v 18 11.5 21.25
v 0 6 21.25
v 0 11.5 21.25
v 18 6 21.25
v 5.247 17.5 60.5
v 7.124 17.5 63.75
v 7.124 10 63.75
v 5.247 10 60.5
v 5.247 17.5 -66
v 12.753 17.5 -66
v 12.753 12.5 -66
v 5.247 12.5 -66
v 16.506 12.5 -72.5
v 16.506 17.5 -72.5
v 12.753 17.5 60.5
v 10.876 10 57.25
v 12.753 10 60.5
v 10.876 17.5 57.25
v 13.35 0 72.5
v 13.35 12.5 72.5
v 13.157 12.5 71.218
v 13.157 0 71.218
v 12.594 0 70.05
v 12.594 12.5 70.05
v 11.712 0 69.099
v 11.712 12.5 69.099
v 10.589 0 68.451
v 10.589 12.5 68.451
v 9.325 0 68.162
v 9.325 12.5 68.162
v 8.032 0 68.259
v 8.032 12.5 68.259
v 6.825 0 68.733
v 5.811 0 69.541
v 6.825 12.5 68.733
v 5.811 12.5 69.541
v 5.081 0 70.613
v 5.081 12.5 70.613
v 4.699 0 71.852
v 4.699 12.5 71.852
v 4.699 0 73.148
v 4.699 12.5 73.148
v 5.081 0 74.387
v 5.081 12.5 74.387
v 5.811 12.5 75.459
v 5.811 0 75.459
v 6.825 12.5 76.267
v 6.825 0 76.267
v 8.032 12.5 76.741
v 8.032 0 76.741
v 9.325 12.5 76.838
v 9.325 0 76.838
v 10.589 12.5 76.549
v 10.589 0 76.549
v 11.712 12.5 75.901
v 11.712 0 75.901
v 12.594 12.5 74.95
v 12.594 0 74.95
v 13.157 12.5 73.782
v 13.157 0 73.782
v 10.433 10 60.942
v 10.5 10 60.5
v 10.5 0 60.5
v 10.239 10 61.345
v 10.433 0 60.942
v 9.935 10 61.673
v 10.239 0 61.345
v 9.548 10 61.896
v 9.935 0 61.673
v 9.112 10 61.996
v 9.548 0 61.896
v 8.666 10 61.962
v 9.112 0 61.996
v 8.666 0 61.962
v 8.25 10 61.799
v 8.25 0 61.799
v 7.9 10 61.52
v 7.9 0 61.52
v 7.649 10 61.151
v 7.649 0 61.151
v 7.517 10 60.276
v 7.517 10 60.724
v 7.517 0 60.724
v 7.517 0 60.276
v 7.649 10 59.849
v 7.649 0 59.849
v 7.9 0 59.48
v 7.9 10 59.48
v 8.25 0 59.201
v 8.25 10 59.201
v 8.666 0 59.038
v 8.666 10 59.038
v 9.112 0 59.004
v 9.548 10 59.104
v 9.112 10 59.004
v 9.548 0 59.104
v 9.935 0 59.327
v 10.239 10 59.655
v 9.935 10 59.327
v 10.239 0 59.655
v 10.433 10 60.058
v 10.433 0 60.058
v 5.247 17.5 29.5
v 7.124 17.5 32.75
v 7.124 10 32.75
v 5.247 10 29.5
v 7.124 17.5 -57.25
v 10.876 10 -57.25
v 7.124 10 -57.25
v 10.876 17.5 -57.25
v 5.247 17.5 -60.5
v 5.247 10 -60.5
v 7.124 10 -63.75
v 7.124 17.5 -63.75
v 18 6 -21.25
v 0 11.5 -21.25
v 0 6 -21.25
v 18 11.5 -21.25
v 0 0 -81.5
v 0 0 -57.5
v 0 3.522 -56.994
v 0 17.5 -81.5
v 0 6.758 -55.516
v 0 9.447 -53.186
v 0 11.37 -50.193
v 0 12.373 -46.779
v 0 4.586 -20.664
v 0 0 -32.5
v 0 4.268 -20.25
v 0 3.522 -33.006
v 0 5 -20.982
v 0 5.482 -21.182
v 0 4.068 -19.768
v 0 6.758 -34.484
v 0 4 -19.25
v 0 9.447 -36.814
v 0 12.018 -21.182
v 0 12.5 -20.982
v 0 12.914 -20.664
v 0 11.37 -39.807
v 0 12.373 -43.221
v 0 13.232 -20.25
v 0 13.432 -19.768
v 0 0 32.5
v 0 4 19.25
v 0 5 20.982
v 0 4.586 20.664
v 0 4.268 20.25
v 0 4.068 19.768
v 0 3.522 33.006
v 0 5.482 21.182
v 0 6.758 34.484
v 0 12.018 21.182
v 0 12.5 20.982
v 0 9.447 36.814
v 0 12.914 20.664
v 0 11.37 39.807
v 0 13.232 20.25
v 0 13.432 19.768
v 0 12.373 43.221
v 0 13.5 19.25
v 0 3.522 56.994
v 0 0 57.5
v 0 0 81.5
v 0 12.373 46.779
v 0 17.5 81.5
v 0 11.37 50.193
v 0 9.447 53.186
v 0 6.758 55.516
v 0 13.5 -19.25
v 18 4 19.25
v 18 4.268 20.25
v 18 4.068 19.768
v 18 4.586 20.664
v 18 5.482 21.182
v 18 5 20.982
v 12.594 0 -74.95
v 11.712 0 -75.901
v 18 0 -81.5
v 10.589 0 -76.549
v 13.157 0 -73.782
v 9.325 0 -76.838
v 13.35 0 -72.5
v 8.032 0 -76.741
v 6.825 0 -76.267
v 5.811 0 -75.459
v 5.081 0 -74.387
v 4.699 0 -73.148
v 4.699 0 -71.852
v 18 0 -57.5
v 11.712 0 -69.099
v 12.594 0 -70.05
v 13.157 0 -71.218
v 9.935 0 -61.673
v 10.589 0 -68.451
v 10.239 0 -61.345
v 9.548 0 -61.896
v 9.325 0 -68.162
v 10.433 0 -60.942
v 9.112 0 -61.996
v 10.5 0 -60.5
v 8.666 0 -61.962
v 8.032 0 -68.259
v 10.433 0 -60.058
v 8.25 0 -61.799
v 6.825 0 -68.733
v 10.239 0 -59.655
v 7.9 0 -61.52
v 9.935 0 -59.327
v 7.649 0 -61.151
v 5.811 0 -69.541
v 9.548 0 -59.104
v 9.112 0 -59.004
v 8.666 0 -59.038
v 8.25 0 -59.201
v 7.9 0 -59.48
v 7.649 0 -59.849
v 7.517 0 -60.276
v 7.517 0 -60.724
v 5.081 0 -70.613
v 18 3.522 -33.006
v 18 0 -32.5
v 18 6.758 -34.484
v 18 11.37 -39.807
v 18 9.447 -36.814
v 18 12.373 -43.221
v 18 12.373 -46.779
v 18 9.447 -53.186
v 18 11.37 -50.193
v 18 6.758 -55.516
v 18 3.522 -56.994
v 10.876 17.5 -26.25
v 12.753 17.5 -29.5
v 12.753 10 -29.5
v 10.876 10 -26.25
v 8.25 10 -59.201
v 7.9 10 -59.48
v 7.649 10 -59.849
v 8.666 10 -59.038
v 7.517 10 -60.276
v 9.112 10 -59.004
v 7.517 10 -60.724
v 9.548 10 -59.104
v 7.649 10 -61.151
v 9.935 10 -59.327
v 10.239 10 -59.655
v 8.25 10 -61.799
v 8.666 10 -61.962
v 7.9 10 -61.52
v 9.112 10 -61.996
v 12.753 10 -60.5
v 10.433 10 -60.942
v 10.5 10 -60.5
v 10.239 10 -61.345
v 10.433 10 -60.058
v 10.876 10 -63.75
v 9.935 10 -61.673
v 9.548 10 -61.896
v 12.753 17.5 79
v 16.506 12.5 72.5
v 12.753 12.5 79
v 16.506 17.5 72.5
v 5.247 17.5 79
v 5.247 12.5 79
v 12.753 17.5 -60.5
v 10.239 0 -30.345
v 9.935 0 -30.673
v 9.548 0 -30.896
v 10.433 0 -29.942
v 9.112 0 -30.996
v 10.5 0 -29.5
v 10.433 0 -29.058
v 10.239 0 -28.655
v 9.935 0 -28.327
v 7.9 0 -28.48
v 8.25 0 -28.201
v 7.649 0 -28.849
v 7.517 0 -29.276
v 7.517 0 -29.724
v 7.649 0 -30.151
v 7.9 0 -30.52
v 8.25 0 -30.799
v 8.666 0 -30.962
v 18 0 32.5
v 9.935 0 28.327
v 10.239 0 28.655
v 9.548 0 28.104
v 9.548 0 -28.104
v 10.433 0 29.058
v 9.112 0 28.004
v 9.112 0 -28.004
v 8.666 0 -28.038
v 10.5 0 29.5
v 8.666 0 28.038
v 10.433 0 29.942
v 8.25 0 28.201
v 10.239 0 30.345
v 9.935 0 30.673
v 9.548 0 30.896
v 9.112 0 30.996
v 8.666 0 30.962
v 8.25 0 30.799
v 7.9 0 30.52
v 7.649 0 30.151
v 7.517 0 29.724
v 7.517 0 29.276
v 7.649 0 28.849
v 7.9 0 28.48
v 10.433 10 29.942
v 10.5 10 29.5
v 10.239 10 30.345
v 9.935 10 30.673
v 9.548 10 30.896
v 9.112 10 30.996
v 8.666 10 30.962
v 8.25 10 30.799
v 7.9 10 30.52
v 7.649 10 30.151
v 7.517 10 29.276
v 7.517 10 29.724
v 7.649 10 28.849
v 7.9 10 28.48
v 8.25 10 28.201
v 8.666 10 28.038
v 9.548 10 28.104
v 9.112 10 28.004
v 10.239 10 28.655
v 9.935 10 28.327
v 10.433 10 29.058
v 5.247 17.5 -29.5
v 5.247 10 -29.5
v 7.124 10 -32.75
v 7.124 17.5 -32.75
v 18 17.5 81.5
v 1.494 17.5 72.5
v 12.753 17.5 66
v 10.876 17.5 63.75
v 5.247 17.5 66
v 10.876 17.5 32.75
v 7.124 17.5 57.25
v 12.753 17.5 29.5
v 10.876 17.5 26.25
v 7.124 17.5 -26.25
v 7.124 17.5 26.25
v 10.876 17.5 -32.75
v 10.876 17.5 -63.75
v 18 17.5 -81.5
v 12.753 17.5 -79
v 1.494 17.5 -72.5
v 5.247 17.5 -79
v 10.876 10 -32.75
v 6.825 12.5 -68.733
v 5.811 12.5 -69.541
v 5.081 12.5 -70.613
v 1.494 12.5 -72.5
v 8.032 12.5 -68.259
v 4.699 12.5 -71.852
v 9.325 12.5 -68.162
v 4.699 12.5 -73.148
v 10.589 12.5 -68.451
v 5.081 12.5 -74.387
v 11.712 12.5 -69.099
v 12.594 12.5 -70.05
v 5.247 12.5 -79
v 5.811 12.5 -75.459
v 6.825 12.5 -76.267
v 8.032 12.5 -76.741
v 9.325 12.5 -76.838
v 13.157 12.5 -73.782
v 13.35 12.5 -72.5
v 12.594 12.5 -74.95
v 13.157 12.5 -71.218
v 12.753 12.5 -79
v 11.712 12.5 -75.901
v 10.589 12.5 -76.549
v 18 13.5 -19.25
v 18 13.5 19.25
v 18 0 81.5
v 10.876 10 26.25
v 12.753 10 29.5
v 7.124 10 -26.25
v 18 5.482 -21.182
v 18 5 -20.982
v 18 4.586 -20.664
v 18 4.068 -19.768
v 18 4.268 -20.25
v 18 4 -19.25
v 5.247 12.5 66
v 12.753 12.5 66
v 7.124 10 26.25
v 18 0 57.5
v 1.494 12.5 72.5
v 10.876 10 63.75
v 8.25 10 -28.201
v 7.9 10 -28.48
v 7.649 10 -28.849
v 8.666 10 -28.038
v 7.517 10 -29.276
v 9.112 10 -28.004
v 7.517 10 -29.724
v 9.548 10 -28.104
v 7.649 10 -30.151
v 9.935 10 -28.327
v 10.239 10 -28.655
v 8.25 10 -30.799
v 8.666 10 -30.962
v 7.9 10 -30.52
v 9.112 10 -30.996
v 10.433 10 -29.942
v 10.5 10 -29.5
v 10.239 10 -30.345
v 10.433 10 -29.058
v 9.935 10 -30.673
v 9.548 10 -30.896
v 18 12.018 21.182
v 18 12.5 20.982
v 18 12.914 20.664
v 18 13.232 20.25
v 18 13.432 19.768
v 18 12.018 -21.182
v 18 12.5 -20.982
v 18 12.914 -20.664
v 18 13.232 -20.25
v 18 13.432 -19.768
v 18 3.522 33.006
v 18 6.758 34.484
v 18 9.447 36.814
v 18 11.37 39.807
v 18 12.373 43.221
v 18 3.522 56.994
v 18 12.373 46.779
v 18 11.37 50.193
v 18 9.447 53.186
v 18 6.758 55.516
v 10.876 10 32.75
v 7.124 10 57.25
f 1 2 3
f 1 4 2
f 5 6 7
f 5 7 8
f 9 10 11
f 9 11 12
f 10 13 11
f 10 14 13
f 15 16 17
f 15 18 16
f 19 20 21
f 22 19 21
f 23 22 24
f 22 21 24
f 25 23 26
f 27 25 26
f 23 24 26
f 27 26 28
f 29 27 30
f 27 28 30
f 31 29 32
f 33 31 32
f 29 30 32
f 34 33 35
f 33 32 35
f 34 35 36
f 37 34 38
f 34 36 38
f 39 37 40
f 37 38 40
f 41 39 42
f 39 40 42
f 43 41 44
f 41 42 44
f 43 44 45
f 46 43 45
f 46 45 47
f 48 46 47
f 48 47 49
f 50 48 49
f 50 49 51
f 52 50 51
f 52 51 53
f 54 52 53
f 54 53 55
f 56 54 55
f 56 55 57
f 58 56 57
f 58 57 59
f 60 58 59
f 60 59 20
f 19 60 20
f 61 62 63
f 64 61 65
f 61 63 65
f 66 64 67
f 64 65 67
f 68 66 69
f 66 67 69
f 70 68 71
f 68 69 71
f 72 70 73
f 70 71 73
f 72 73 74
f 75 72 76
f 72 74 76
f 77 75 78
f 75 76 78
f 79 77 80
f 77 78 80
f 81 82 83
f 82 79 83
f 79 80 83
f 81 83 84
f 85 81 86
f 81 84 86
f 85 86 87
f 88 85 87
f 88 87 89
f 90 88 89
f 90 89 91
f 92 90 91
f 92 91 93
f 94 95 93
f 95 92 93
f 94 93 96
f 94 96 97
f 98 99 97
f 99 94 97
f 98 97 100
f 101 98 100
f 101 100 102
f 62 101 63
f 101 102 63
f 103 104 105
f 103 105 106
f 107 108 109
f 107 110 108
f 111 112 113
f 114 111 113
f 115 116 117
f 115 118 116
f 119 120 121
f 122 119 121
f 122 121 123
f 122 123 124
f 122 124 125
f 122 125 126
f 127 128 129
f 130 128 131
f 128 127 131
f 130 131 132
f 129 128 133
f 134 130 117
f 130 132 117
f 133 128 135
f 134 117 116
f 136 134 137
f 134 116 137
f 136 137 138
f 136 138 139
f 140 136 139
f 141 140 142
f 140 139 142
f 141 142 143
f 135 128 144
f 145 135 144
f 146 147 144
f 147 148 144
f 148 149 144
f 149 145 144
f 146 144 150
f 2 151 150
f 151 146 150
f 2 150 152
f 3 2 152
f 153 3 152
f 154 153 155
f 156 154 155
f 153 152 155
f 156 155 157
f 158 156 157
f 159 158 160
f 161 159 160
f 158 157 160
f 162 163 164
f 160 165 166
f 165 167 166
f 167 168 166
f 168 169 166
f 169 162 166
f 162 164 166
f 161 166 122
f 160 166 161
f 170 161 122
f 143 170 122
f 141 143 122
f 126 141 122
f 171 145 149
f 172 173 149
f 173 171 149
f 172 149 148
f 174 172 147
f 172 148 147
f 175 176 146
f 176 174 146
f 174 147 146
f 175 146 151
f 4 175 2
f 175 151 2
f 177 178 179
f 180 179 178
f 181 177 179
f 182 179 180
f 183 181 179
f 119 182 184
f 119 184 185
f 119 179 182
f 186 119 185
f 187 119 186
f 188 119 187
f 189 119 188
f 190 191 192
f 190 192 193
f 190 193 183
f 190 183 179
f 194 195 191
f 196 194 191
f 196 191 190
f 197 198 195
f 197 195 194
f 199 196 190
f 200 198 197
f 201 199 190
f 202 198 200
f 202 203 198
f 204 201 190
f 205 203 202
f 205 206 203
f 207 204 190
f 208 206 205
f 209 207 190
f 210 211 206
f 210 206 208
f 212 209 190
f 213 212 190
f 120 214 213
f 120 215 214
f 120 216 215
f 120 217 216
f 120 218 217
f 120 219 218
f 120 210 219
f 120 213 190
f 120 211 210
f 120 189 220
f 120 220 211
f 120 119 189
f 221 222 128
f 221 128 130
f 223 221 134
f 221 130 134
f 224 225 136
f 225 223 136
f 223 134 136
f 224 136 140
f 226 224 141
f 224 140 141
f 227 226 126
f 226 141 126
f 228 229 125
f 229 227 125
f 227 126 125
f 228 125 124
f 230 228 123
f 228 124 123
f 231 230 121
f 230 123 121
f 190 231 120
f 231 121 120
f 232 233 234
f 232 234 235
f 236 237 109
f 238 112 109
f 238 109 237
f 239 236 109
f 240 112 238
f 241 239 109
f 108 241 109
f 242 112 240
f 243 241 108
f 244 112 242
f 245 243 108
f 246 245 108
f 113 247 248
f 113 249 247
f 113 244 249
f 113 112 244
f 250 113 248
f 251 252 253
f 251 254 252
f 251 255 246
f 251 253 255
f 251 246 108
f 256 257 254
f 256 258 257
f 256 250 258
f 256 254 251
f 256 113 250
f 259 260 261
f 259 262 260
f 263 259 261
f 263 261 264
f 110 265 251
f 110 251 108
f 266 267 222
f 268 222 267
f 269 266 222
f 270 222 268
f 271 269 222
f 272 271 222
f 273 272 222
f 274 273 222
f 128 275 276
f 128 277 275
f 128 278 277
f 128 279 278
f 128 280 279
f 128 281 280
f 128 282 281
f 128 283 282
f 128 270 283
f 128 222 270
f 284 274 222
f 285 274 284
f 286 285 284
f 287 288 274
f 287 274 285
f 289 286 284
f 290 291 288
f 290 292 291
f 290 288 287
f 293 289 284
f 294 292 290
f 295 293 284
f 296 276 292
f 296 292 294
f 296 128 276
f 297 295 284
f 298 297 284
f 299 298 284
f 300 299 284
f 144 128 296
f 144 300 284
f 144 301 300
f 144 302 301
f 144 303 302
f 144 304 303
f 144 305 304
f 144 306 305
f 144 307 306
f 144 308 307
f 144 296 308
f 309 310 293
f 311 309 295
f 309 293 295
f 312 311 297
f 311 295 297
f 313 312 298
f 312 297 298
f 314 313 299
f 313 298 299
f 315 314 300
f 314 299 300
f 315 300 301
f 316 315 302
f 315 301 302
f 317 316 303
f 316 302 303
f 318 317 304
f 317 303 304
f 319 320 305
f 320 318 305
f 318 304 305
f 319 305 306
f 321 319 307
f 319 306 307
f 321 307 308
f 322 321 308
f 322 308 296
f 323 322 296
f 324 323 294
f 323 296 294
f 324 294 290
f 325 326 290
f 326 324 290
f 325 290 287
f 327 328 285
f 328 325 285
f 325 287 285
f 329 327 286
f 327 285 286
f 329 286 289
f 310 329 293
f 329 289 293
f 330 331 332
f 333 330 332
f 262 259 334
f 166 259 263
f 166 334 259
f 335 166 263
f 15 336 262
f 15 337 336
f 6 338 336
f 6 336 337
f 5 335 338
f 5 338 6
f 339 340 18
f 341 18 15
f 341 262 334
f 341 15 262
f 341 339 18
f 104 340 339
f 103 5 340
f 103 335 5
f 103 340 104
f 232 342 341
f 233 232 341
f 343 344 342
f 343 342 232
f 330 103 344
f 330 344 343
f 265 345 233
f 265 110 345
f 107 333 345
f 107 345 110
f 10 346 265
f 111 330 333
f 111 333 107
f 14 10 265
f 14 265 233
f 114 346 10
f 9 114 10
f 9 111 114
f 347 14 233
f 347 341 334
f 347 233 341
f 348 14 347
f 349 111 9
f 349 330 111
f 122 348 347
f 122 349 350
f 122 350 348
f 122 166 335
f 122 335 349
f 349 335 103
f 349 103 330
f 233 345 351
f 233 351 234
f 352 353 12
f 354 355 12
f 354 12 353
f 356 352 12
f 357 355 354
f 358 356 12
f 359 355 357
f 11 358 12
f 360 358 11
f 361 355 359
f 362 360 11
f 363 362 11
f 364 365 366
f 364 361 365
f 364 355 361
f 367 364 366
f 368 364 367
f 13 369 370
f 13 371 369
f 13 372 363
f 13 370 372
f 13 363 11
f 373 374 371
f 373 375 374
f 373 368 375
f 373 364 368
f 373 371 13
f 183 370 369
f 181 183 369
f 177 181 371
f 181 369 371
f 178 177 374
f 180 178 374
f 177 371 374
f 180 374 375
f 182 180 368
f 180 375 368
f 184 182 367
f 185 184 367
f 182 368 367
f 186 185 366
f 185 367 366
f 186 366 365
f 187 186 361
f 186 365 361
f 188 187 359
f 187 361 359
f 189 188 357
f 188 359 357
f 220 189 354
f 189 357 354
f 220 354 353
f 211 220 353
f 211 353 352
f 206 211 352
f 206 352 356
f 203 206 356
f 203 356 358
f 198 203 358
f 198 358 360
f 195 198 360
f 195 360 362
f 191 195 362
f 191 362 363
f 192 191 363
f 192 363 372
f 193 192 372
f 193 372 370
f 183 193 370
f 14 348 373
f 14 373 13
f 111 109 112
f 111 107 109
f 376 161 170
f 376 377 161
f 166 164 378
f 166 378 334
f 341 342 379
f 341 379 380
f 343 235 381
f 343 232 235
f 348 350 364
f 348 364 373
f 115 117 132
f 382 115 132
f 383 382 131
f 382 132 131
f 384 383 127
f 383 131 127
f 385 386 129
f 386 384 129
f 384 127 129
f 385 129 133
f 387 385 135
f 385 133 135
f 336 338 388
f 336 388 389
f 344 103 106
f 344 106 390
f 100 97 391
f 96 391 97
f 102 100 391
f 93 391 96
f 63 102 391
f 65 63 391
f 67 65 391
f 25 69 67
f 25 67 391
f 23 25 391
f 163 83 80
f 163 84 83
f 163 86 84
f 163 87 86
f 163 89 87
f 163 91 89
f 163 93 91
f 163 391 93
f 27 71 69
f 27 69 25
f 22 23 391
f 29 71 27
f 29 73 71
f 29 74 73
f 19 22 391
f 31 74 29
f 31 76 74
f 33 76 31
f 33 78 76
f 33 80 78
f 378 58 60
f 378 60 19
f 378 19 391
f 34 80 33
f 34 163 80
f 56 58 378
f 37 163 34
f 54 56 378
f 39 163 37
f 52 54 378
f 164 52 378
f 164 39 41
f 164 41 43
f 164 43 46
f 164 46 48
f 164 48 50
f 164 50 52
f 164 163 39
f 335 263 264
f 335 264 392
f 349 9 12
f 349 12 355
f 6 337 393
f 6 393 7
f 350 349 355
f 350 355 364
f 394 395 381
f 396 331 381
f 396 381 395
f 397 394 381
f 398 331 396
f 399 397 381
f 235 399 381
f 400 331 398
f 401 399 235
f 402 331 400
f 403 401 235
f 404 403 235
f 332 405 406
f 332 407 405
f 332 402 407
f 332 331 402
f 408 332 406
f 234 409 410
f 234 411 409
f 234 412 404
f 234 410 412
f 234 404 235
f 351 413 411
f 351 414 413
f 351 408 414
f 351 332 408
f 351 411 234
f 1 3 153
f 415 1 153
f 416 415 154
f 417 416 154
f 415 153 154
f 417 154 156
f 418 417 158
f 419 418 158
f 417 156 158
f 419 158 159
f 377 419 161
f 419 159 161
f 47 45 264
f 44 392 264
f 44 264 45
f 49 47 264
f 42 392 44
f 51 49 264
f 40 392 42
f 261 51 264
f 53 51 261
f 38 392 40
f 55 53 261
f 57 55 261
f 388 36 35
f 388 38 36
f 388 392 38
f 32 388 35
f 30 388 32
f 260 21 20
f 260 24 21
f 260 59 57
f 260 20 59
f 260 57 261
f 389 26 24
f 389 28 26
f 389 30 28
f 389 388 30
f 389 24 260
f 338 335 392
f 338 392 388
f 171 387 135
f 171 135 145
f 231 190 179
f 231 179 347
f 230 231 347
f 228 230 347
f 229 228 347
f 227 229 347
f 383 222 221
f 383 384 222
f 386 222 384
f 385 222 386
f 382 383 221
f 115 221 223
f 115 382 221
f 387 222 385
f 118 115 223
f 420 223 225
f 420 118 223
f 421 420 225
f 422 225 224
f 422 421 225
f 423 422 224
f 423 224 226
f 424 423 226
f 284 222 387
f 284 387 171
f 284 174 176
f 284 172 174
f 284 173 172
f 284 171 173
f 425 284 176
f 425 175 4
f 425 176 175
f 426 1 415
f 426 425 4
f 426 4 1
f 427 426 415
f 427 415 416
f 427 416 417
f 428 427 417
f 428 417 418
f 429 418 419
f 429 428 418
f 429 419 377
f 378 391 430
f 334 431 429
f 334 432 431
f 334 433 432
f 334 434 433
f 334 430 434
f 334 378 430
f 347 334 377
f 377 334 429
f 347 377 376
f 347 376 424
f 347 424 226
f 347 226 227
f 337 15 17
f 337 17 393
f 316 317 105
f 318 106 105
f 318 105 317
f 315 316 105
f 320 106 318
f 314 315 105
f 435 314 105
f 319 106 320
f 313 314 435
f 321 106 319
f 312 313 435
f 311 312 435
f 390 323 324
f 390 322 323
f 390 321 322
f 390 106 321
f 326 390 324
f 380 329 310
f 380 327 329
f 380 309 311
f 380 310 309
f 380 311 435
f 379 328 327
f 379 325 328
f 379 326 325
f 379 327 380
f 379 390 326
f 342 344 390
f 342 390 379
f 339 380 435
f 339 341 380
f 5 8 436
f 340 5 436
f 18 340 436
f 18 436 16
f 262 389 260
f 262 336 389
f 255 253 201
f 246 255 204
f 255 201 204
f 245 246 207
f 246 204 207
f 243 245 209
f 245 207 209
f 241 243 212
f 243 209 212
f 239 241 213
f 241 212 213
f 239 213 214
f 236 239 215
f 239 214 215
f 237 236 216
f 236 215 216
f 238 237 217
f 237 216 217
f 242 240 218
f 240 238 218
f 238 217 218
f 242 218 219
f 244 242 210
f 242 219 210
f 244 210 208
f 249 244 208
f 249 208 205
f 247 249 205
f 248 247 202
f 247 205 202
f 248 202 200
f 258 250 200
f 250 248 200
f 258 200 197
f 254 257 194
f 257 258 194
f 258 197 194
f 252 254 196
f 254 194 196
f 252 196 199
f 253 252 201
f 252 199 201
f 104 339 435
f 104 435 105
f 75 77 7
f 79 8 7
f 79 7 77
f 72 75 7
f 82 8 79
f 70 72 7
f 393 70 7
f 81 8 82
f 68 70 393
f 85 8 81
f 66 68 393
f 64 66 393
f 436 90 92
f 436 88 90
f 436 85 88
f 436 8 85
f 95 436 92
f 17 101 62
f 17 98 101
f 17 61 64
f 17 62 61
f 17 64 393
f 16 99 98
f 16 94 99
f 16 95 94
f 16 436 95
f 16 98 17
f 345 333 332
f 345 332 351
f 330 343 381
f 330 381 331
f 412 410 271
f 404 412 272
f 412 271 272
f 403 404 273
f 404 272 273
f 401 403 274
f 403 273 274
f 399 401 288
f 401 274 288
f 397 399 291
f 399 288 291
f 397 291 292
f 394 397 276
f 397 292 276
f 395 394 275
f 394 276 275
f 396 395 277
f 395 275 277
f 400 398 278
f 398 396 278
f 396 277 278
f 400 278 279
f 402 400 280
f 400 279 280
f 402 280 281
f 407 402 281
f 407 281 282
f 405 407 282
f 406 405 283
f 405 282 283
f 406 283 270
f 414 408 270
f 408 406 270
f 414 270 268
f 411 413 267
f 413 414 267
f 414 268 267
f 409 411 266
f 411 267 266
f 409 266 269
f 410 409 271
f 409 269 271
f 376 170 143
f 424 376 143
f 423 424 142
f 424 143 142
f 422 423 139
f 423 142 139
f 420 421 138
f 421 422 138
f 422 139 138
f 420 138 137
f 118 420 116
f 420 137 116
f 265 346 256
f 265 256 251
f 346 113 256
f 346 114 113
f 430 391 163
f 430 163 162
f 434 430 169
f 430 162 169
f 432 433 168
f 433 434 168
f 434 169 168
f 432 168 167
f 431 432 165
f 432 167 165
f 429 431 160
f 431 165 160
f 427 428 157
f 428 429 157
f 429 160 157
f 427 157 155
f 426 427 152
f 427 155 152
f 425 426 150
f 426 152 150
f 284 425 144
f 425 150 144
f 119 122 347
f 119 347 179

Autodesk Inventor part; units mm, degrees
ref_plane "YZ Plane" through (0, 0, 0) normal (1, 0, 0) x (0, 1, 0)
ref_plane "XZ Plane" through (0, 0, 0) normal (0, 1, 0) x (-1, 0, 0)
ref_plane "XY Plane" through (0, 0, 0) normal (0, 0, 1) x (1, 0, 0)
sketch "Sketch1" plane through (0, 0, 0) normal (1, 0, 0) x (0, 1, 0)
  arc A0 (0, 32.5) -> (0, 57.5) centre (0, 45) ccw
  arc A1 (0, -57.5) -> (0, -32.5) centre (0, -45) ccw
  line L0 (0, 81.5) -> (17.5, 81.5)
  line L1 (17.5, 81.5) -> (17.5, -81.5)
  line L2 (17.5, -81.5) -> (0, -81.5)
  line L3 (0, 57.5) -> (0, 81.5)
  line L4 (0, -81.5) -> (0, -57.5)
  line L5 (0, -32.5) -> (0, 32.5)
  point P0 (0, 0)
  point P1 (0, 0)
  point P2 (17.5, 0)
  point P3 (0, 69.5)
  point P4 (0, -69.5)
  point P5 (12.5, 45)
  dimension "d0" = 25
  dimension "d2" = 90
  dimension "d3" = 45
  dimension "d4" = 24
  dimension "d15" = 5
extrude "Extrusion1" add sketch "Sketch1" along normal blind 18
sketch "Sketch2" plane through (0, 17.5, 81.5) normal (0, 1, 0) x (1, 0, 0)
  circle A0 centre (9, 9) radius 4.35
  circle A1 centre (9, 154) radius 4.35
  line L0 (18, 163) -> (18, 0) projected
  line L1 (0, 0) -> (18, 0) projected
  line L2 (0, 163) -> (18, 163) projected
  point P0 (0, 81.5)
  dimension "d7" = 8.7
  dimension "d8" = 8.7
  dimension "d9" = 9
  dimension "d10" = 9
  dimension "d11" = 9
extrude "Extrusion2" cut sketch "Sketch2" against normal blind 29.5
sketch "Sketch3" plane through (0, 17.5, 81.5) normal (0, 1, 0) x (1, 0, 0)
  circle A0 centre (9, 154) radius 4.35 projected
  line L0 (12.7528, 160.5) -> (16.5056, 154)
  line L1 (16.5056, 154) -> (12.7528, 147.5)
  line L2 (12.7528, 147.5) -> (5.2472, 147.5)
  line L3 (5.2472, 147.5) -> (1.4944, 154)
  line L4 (1.4944, 154) -> (5.2472, 160.5)
  line L5 (5.2472, 160.5) -> (12.7528, 160.5)
  line L6 (0, 163) -> (18, 163) projected
  circle A1 centre (9, 9) radius 4.35 projected
  line L7 (12.7528, 2.5) -> (5.2472, 2.5)
  line L8 (5.2472, 2.5) -> (1.4944, 9)
  line L9 (1.4944, 9) -> (5.2472, 15.5)
  line L10 (5.2472, 15.5) -> (12.7528, 15.5)
  line L11 (12.7528, 15.5) -> (16.5056, 9)
  line L12 (16.5056, 9) -> (12.7528, 2.5)
  line L13 (0, 0) -> (18, 0) projected
  point P0 (0, 81.5)
  dimension "d16" = 13
  dimension "d17" = 13
extrude "Extrusion3" cut sketch "Sketch3" against normal blind 5
sketch "Sketch4" plane through (0, 0, 57.5) normal (0, -1, 0) x (1, 0, 0)
  circle A0 centre (9, 3) radius 1.5
  circle A1 centre (9, -28) radius 1.5
  circle A2 centre (9, -87) radius 1.5
  circle A3 centre (9, -118) radius 1.5
  line L0 (0, 0) -> (18, 0) projected
  line L1 (0, -25) -> (18, -25) projected
  line L2 (0, -90) -> (18, -90) projected
  line L3 (0, -115) -> (18, -115) projected
  line L4 (0, -139) -> (18, -139) projected
  point P0 (0, -57.5)
  point P1 (9, -139)
  dimension "d20" = 3
  dimension "d21" = 3
  dimension "d22" = 3
  dimension "d23" = 3
  dimension "d24" = 3
extrude "Extrusion4" cut sketch "Sketch4" against normal blind 22
sketch "Sketch5" plane through (0, 17.5, 81.5) normal (0, 1, 0) x (1, 0, 0)
  circle A0 centre (9, 21) radius 1.5 projected
  line L0 (10.8764, 24.25) -> (12.7528, 21)
  line L1 (12.7528, 21) -> (10.8764, 17.75)
  line L2 (10.8764, 17.75) -> (7.1236, 17.75)
  line L3 (7.1236, 17.75) -> (5.2472, 21)
  line L4 (5.2472, 21) -> (7.1236, 24.25)
  line L5 (7.1236, 24.25) -> (10.8764, 24.25)
  circle A1 centre (9, 52) radius 1.5 projected
  line L6 (7.1236, 55.25) -> (10.8764, 55.25)
  line L7 (10.8764, 55.25) -> (12.7528, 52)
  line L8 (12.7528, 52) -> (10.8764, 48.75)
  line L9 (10.8764, 48.75) -> (7.1236, 48.75)
  line L10 (7.1236, 48.75) -> (5.2472, 52)
  line L11 (5.2472, 52) -> (7.1236, 55.25)
  circle A2 centre (9, 111) radius 1.5 projected
  line L12 (7.1236, 114.25) -> (10.8764, 114.25)
  line L13 (10.8764, 114.25) -> (12.7528, 111)
  line L14 (12.7528, 111) -> (10.8764, 107.75)
  line L15 (10.8764, 107.75) -> (7.1236, 107.75)
  line L16 (7.1236, 107.75) -> (5.2472, 111)
  line L17 (5.2472, 111) -> (7.1236, 114.25)
  circle A3 centre (9, 142) radius 1.5 projected
  line L18 (7.1236, 145.25) -> (10.8764, 145.25)
  line L19 (10.8764, 145.25) -> (12.7528, 142)
  line L20 (12.7528, 142) -> (10.8764, 138.75)
  line L21 (10.8764, 138.75) -> (7.1236, 138.75)
  line L22 (7.1236, 138.75) -> (5.2472, 142)
  line L23 (5.2472, 142) -> (7.1236, 145.25)
  line L24 (12.7528, 147.5) -> (5.2472, 147.5) projected
  point P0 (0, 81.5)
  dimension "d27" = 6.5
  dimension "d28" = 6.5
  dimension "d29" = 6.5
  dimension "d30" = 6.5
extrude "Extrusion5" cut sketch "Sketch5" against normal blind 7.5
sketch "Sketch6" plane through (18, 0, 0) normal (1, 0, 0) x (0, 0, -1)
  line L0 (-21.25, 13.5) -> (21.25, 13.5)
  line L1 (21.25, 13.5) -> (21.25, 4)
  line L2 (21.25, 4) -> (-21.25, 4)
  line L3 (-21.25, 4) -> (-21.25, 13.5)
  line L4 (-26.25, 17.5) -> (-26.25, 10) projected
  line L5 (26.25, 17.5) -> (26.25, 10) projected
  line L6 (81.5, 17.5) -> (-81.5, 17.5) projected
  point P0 (0, 0)
  dimension "d33" = 5
  dimension "d34" = 5
  dimension "d35" = 4
  dimension "d36" = 4
extrude "Extrusion6" cut sketch "Sketch6" against normal blind 60.25
fillet "Fillet1" radius 2 4 edges at (9, 4, 21.25) (9, 13.5, 21.25) (9, 13.5, -21.25) (9, 4, -21.25)
properties part number "Mount_Block"
